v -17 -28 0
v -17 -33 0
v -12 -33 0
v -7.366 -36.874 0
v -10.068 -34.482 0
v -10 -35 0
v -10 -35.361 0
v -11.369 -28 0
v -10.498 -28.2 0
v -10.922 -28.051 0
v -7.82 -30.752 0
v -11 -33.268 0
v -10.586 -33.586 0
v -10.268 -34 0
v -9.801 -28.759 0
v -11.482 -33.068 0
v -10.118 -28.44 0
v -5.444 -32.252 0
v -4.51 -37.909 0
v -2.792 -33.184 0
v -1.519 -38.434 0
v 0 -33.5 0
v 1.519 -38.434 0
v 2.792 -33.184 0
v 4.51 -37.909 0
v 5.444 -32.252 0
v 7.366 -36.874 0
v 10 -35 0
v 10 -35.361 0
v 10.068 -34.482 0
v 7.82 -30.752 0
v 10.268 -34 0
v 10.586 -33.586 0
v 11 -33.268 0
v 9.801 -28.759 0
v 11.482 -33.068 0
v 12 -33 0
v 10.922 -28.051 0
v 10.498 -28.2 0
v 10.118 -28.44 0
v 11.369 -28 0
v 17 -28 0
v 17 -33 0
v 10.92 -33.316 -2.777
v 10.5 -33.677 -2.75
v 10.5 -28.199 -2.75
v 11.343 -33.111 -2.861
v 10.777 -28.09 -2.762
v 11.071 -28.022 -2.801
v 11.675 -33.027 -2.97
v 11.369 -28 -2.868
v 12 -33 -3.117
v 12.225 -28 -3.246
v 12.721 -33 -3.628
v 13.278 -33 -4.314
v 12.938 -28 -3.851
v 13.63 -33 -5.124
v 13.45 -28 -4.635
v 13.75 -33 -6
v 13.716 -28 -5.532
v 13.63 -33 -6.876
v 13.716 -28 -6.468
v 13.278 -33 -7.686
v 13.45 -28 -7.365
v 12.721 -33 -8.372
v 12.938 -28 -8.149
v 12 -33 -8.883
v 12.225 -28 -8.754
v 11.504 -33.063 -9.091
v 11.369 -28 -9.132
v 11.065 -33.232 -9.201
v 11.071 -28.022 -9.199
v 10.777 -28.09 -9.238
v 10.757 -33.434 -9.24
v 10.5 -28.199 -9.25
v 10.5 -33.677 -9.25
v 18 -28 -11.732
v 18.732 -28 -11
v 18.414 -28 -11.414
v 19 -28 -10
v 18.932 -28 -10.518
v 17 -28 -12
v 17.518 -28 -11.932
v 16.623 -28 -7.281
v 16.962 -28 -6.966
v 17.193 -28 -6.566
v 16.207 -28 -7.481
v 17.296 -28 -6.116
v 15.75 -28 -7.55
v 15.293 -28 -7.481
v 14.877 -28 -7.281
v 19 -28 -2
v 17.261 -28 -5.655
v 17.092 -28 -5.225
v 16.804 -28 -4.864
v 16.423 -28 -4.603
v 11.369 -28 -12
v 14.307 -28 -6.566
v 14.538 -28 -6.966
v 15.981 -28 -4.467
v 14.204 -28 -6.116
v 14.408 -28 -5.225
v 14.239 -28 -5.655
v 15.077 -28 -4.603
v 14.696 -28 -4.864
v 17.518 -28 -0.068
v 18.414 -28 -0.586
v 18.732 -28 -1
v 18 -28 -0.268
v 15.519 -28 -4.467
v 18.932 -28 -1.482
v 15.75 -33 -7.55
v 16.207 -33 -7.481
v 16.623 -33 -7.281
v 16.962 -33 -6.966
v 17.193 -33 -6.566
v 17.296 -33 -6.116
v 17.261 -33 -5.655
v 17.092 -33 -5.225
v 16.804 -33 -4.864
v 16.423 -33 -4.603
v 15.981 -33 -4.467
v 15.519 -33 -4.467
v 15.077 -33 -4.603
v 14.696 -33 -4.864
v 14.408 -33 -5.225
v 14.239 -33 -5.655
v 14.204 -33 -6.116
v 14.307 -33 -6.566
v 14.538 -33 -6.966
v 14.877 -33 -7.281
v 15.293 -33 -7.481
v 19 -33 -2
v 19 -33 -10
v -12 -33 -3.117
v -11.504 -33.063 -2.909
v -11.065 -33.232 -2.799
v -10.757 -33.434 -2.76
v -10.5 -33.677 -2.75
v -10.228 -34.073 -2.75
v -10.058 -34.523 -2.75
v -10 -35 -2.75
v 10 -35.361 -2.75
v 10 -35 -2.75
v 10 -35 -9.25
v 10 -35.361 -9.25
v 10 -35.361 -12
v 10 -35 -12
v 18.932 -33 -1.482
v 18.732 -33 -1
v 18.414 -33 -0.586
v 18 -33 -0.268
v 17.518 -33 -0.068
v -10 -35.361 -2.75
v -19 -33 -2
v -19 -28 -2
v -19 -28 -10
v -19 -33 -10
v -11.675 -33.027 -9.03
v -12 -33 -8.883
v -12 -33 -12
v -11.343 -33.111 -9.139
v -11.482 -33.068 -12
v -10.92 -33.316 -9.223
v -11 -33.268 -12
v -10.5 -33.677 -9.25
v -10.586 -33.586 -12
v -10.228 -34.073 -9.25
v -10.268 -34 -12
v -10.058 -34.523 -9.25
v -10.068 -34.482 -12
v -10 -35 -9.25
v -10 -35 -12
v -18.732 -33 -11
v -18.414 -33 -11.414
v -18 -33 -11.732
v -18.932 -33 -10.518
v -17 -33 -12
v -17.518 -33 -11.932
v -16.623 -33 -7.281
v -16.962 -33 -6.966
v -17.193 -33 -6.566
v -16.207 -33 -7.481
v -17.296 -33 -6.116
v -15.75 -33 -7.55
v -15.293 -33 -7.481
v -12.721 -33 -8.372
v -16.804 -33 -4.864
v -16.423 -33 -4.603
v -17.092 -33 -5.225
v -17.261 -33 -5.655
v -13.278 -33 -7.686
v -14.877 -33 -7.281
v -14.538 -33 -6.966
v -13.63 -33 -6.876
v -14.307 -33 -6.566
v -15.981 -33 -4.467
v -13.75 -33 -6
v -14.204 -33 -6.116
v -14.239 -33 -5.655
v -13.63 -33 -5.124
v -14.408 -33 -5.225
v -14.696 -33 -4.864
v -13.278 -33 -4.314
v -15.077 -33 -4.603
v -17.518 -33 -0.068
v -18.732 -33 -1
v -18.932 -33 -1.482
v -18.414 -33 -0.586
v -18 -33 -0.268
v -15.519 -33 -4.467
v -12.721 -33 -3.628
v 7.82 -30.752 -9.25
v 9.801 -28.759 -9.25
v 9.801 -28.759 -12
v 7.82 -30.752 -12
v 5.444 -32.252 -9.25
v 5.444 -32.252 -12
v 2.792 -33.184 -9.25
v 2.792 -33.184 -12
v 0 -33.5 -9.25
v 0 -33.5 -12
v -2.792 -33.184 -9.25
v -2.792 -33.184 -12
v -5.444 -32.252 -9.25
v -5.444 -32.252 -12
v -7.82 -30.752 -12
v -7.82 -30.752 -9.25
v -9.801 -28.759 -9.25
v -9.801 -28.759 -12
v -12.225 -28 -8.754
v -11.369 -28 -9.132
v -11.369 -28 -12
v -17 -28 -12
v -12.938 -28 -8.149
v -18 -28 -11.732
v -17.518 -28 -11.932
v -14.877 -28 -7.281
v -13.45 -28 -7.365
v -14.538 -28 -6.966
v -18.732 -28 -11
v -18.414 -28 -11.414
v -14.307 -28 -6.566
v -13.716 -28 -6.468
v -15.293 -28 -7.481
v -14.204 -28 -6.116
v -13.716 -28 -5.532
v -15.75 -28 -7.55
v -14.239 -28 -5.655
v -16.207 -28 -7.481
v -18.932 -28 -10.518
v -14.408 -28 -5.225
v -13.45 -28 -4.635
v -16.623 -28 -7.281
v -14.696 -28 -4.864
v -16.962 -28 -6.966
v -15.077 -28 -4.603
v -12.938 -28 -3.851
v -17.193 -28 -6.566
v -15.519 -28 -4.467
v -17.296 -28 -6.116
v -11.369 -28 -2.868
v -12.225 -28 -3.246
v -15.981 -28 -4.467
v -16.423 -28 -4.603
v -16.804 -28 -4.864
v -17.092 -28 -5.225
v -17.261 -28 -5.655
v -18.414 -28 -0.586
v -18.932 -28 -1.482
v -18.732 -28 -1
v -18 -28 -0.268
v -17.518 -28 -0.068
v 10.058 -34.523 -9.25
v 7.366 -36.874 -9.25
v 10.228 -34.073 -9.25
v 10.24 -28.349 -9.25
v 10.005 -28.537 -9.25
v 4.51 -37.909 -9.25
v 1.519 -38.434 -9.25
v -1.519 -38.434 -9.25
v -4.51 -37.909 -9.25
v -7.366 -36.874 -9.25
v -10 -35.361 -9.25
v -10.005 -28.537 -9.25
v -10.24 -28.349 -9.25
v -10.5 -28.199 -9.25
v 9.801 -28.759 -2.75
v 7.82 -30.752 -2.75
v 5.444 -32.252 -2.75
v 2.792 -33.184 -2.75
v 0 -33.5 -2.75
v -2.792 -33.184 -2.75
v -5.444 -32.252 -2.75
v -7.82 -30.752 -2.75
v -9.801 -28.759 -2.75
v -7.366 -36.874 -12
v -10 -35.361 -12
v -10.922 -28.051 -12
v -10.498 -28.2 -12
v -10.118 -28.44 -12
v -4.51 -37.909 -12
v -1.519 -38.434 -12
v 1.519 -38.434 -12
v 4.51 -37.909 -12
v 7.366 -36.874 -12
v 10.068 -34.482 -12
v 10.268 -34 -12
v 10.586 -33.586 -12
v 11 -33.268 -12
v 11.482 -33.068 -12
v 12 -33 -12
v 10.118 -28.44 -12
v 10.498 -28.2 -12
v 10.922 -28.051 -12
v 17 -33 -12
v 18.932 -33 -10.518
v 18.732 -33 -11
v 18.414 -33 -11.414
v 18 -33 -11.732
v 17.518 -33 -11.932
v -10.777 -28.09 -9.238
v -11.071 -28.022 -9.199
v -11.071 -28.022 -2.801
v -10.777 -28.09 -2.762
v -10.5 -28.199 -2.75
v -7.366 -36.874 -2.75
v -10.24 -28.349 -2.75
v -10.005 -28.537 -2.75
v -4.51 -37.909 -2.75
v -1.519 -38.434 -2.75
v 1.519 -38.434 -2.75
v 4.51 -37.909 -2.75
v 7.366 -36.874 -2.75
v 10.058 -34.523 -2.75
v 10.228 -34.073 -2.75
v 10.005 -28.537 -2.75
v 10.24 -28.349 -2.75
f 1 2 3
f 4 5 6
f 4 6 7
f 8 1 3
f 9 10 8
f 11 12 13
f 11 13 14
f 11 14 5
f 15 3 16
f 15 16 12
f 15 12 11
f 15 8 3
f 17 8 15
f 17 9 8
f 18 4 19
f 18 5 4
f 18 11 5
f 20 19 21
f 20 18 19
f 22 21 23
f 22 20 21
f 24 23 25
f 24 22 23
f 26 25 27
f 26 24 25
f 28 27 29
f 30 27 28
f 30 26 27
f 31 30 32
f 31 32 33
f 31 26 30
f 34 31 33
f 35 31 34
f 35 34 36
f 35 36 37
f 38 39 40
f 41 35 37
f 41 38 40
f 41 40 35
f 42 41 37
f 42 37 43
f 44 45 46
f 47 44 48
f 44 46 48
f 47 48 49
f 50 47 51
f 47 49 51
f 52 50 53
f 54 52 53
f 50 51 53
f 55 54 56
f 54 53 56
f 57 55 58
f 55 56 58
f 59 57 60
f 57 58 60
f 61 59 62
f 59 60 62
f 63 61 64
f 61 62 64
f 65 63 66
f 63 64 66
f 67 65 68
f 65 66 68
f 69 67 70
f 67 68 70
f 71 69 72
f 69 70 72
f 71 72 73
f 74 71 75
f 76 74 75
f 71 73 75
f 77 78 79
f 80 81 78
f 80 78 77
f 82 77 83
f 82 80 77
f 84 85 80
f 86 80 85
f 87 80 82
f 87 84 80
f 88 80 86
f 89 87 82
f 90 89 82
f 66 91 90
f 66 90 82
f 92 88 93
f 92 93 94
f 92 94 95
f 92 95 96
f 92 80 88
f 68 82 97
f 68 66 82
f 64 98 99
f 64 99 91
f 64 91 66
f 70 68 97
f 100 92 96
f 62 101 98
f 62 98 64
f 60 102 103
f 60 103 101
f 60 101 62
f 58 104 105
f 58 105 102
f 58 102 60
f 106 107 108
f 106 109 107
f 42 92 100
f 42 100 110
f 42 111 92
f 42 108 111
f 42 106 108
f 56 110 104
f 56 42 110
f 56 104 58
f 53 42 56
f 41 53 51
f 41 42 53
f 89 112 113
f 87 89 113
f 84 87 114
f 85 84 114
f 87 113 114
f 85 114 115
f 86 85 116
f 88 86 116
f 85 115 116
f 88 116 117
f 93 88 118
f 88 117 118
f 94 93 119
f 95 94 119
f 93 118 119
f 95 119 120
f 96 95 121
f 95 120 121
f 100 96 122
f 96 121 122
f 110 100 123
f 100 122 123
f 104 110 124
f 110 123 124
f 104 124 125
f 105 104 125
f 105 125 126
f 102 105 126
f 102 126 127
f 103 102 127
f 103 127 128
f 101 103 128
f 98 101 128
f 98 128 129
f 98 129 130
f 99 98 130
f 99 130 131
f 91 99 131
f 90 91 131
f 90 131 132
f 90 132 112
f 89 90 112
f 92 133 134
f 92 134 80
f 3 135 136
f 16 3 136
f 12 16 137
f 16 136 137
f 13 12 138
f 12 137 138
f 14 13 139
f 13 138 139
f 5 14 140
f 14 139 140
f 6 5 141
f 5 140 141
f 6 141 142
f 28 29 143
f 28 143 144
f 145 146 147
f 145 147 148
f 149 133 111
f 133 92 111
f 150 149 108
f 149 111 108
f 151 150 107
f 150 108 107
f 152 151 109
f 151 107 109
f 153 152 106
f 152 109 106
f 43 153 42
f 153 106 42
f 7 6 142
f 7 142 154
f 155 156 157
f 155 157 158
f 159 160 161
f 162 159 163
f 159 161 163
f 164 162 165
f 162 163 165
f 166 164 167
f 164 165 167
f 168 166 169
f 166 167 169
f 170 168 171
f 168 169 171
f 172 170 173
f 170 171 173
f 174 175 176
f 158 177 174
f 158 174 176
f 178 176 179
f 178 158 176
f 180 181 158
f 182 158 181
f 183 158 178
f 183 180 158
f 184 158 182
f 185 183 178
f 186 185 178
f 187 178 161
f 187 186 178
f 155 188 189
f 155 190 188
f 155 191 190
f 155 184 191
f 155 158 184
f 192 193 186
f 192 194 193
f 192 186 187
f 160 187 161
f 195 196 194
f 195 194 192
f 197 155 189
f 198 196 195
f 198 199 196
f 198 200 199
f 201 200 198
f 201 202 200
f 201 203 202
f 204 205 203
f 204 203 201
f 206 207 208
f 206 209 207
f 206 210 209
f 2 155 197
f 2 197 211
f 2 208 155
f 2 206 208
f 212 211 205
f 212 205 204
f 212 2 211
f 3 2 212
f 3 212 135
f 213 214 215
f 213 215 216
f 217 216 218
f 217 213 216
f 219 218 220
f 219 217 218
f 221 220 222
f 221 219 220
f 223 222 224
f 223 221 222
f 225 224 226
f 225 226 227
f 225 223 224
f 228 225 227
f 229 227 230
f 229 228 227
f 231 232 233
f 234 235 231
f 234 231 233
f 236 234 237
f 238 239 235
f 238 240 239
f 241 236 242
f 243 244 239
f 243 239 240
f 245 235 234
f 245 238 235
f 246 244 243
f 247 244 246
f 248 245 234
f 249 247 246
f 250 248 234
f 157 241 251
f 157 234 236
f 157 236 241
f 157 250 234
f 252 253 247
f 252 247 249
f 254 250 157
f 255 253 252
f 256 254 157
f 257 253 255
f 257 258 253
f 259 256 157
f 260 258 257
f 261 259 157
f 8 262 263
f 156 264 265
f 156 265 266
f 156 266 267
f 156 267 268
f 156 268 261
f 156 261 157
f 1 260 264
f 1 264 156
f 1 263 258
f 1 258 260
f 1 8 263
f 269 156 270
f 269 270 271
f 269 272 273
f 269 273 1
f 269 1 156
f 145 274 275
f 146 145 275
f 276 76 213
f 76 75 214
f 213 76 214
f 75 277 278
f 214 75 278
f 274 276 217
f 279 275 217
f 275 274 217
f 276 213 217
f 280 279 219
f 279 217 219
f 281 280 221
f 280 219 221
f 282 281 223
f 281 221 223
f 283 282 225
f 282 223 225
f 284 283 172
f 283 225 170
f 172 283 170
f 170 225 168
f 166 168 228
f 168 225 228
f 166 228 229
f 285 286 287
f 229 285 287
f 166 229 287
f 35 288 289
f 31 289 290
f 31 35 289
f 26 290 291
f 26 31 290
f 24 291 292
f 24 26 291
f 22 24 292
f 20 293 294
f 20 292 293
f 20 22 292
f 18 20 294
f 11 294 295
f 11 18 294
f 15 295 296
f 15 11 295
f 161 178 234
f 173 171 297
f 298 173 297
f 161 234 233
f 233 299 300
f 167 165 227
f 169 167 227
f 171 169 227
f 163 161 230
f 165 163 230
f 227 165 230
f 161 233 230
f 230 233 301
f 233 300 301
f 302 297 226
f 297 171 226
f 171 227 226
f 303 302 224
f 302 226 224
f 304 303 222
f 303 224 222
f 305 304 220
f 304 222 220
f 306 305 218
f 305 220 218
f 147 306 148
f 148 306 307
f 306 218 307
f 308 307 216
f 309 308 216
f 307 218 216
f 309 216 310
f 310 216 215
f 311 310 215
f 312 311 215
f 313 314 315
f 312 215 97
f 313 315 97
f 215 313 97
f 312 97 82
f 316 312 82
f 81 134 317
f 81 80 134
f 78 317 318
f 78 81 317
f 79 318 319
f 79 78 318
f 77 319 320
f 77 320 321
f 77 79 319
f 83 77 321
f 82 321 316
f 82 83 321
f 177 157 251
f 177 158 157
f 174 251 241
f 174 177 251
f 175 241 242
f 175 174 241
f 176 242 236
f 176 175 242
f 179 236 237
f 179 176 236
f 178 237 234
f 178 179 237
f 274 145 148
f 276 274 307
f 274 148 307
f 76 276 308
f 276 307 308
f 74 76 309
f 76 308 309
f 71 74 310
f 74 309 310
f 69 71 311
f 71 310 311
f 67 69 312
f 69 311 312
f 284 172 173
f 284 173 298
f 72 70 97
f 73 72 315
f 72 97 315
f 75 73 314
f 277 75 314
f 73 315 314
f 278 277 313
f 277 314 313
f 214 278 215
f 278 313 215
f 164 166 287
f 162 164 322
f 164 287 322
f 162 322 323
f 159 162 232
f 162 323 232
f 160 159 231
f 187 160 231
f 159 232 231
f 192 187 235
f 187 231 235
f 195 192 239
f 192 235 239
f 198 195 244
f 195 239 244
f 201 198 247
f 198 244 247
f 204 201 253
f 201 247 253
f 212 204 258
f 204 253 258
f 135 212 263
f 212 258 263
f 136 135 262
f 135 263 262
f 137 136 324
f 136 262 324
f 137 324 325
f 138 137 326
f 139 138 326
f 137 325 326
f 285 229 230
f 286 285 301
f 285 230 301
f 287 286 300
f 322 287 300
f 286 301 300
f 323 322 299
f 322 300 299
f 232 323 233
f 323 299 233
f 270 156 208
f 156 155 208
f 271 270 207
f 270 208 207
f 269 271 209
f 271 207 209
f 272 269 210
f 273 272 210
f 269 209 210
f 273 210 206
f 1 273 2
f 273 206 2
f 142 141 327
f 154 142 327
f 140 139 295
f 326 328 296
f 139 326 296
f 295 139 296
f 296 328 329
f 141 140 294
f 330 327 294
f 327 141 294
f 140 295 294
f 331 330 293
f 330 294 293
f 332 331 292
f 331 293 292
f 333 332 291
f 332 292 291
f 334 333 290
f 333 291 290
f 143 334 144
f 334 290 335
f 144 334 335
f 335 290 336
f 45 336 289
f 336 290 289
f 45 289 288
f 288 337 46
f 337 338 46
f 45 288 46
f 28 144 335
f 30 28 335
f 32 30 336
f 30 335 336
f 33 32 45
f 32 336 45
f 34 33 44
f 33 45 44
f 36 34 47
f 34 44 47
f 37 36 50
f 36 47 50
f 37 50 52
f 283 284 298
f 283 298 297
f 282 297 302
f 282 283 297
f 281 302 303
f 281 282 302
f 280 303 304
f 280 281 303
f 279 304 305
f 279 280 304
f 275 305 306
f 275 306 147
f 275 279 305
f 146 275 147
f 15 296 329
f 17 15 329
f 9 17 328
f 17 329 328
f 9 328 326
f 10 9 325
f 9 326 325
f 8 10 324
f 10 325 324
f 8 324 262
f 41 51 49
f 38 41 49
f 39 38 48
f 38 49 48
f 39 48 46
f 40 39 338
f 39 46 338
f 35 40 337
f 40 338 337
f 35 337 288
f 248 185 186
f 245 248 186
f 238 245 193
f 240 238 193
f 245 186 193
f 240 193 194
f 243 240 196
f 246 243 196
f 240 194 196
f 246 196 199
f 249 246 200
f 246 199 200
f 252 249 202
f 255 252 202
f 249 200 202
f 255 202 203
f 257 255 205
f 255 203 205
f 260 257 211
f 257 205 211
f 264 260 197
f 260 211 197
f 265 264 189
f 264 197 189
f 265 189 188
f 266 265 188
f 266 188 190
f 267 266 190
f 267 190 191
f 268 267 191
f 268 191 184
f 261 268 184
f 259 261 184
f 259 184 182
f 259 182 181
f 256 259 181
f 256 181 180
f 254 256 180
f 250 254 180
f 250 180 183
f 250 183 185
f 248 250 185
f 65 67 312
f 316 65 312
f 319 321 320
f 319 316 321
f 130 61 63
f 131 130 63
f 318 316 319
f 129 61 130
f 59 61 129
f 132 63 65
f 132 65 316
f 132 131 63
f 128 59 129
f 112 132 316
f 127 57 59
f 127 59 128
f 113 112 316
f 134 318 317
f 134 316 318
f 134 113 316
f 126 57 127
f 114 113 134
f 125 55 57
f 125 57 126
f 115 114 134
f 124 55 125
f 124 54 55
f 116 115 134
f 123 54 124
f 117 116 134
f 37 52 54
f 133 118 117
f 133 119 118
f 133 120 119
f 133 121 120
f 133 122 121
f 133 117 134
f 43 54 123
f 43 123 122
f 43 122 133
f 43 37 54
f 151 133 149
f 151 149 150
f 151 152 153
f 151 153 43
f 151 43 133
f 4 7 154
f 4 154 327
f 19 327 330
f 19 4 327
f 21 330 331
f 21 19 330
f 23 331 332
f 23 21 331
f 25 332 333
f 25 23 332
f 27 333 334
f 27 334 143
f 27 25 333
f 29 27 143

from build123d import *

# Parameters (mm, degrees)
EXTRUDE_1_DEPTH     = 12
FILLET_2_R          = 2
SKETCH_2_R          = 1.55
CUT_EXTRUDE_3_DEPTH = 12
SKETCH_3_R          = 3.25
CUT_EXTRUDE_4_DEPTH = 29.62434104


with BuildPart() as part:
    # Эскиз1 → Бобышка-Вытянуть1 (new body)
    with BuildSketch(Plane.XY):
        with BuildLine():
            Line((-14, -28), (-19, -28))
            Line((-19, -28), (-19, -33))
            Line((-19, -33), (-10, -33))
            Line((-10, -33), (-10, -35.361406616))
            ThreePointArc((-10, -35.361406616), (0, -38.5), (10, -35.361406616))
            Line((10, -35.361406616), (10, -33))
            Line((10, -33), (19, -33))
            Line((19, -33), (19, -28))
            Line((19, -28), (14, -28))
            Line((14, -28), (12.5, -28))
            Line((12.5, -28), (10.356157589, -28))
            ThreePointArc((10.356157589, -28), (0, -33.5), (-10.356157589, -28))
            Line((-10.356157589, -28), (-14, -28))
        make_face()
    extrude(amount=-EXTRUDE_1_DEPTH)

    # Скругление2
    fillet_2_edges = [part.edges().sort_by_distance(p)[0] for p in [
        (-19, -30.5, 0),
        (19, -30.5, 0),
        (-10, -33, -6),
        (-10.356157589, -28, -6),
        (10.356157589, -28, -6),
        (10, -33, -6),
        (19, -30.5, -12),
        (-19, -30.5, -12),
    ]]
    fillet(fillet_2_edges, radius=FILLET_2_R)

    # Эскиз2 → Вырез-Вытянуть3 (cut)
    with BuildSketch(Plane.XZ.offset(33)):
        with Locations(Location((15.75, -6, 0), (0, 0, 270))):
            Circle(SKETCH_2_R)
        with Locations(Location((-15.75, -6, 0), (0, 0, 270))):
            Circle(SKETCH_2_R)
    extrude(amount=-CUT_EXTRUDE_3_DEPTH, mode=Mode.SUBTRACT)

    # Эскиз3 → Вырез-Вытянуть4 (cut, through all)
    with BuildSketch(Plane(origin=(0, -20.77, 0), x_dir=(1, 0, 0), z_dir=(0, 1, 0))):
        with Locations((10.5, 6)):
            Circle(SKETCH_3_R)
        with BuildLine():
            Line((0, 9.25), (0, 2.75))
            Line((0, 2.75), (10.5, 2.75))
            ThreePointArc((10.5, 2.75), (7.25, 6), (10.5, 9.25))
            Line((10.5, 9.25), (0, 9.25))
        make_face()
        with BuildLine():
            Line((-10.5, 2.75), (0, 2.75))
            Line((0, 2.75), (0, 9.25))
            Line((0, 9.25), (-10.5, 9.25))
            ThreePointArc((-10.5, 9.25), (-8.201902961, 8.298097039), (-7.25, 6))
            ThreePointArc((-7.25, 6), (-8.201902961, 3.701902961), (-10.5, 2.75))
        make_face()
        with Locations((-10.5, 6)):
            Circle(SKETCH_3_R)
    extrude(amount=-CUT_EXTRUDE_4_DEPTH, mode=Mode.SUBTRACT)


solid = part.part
